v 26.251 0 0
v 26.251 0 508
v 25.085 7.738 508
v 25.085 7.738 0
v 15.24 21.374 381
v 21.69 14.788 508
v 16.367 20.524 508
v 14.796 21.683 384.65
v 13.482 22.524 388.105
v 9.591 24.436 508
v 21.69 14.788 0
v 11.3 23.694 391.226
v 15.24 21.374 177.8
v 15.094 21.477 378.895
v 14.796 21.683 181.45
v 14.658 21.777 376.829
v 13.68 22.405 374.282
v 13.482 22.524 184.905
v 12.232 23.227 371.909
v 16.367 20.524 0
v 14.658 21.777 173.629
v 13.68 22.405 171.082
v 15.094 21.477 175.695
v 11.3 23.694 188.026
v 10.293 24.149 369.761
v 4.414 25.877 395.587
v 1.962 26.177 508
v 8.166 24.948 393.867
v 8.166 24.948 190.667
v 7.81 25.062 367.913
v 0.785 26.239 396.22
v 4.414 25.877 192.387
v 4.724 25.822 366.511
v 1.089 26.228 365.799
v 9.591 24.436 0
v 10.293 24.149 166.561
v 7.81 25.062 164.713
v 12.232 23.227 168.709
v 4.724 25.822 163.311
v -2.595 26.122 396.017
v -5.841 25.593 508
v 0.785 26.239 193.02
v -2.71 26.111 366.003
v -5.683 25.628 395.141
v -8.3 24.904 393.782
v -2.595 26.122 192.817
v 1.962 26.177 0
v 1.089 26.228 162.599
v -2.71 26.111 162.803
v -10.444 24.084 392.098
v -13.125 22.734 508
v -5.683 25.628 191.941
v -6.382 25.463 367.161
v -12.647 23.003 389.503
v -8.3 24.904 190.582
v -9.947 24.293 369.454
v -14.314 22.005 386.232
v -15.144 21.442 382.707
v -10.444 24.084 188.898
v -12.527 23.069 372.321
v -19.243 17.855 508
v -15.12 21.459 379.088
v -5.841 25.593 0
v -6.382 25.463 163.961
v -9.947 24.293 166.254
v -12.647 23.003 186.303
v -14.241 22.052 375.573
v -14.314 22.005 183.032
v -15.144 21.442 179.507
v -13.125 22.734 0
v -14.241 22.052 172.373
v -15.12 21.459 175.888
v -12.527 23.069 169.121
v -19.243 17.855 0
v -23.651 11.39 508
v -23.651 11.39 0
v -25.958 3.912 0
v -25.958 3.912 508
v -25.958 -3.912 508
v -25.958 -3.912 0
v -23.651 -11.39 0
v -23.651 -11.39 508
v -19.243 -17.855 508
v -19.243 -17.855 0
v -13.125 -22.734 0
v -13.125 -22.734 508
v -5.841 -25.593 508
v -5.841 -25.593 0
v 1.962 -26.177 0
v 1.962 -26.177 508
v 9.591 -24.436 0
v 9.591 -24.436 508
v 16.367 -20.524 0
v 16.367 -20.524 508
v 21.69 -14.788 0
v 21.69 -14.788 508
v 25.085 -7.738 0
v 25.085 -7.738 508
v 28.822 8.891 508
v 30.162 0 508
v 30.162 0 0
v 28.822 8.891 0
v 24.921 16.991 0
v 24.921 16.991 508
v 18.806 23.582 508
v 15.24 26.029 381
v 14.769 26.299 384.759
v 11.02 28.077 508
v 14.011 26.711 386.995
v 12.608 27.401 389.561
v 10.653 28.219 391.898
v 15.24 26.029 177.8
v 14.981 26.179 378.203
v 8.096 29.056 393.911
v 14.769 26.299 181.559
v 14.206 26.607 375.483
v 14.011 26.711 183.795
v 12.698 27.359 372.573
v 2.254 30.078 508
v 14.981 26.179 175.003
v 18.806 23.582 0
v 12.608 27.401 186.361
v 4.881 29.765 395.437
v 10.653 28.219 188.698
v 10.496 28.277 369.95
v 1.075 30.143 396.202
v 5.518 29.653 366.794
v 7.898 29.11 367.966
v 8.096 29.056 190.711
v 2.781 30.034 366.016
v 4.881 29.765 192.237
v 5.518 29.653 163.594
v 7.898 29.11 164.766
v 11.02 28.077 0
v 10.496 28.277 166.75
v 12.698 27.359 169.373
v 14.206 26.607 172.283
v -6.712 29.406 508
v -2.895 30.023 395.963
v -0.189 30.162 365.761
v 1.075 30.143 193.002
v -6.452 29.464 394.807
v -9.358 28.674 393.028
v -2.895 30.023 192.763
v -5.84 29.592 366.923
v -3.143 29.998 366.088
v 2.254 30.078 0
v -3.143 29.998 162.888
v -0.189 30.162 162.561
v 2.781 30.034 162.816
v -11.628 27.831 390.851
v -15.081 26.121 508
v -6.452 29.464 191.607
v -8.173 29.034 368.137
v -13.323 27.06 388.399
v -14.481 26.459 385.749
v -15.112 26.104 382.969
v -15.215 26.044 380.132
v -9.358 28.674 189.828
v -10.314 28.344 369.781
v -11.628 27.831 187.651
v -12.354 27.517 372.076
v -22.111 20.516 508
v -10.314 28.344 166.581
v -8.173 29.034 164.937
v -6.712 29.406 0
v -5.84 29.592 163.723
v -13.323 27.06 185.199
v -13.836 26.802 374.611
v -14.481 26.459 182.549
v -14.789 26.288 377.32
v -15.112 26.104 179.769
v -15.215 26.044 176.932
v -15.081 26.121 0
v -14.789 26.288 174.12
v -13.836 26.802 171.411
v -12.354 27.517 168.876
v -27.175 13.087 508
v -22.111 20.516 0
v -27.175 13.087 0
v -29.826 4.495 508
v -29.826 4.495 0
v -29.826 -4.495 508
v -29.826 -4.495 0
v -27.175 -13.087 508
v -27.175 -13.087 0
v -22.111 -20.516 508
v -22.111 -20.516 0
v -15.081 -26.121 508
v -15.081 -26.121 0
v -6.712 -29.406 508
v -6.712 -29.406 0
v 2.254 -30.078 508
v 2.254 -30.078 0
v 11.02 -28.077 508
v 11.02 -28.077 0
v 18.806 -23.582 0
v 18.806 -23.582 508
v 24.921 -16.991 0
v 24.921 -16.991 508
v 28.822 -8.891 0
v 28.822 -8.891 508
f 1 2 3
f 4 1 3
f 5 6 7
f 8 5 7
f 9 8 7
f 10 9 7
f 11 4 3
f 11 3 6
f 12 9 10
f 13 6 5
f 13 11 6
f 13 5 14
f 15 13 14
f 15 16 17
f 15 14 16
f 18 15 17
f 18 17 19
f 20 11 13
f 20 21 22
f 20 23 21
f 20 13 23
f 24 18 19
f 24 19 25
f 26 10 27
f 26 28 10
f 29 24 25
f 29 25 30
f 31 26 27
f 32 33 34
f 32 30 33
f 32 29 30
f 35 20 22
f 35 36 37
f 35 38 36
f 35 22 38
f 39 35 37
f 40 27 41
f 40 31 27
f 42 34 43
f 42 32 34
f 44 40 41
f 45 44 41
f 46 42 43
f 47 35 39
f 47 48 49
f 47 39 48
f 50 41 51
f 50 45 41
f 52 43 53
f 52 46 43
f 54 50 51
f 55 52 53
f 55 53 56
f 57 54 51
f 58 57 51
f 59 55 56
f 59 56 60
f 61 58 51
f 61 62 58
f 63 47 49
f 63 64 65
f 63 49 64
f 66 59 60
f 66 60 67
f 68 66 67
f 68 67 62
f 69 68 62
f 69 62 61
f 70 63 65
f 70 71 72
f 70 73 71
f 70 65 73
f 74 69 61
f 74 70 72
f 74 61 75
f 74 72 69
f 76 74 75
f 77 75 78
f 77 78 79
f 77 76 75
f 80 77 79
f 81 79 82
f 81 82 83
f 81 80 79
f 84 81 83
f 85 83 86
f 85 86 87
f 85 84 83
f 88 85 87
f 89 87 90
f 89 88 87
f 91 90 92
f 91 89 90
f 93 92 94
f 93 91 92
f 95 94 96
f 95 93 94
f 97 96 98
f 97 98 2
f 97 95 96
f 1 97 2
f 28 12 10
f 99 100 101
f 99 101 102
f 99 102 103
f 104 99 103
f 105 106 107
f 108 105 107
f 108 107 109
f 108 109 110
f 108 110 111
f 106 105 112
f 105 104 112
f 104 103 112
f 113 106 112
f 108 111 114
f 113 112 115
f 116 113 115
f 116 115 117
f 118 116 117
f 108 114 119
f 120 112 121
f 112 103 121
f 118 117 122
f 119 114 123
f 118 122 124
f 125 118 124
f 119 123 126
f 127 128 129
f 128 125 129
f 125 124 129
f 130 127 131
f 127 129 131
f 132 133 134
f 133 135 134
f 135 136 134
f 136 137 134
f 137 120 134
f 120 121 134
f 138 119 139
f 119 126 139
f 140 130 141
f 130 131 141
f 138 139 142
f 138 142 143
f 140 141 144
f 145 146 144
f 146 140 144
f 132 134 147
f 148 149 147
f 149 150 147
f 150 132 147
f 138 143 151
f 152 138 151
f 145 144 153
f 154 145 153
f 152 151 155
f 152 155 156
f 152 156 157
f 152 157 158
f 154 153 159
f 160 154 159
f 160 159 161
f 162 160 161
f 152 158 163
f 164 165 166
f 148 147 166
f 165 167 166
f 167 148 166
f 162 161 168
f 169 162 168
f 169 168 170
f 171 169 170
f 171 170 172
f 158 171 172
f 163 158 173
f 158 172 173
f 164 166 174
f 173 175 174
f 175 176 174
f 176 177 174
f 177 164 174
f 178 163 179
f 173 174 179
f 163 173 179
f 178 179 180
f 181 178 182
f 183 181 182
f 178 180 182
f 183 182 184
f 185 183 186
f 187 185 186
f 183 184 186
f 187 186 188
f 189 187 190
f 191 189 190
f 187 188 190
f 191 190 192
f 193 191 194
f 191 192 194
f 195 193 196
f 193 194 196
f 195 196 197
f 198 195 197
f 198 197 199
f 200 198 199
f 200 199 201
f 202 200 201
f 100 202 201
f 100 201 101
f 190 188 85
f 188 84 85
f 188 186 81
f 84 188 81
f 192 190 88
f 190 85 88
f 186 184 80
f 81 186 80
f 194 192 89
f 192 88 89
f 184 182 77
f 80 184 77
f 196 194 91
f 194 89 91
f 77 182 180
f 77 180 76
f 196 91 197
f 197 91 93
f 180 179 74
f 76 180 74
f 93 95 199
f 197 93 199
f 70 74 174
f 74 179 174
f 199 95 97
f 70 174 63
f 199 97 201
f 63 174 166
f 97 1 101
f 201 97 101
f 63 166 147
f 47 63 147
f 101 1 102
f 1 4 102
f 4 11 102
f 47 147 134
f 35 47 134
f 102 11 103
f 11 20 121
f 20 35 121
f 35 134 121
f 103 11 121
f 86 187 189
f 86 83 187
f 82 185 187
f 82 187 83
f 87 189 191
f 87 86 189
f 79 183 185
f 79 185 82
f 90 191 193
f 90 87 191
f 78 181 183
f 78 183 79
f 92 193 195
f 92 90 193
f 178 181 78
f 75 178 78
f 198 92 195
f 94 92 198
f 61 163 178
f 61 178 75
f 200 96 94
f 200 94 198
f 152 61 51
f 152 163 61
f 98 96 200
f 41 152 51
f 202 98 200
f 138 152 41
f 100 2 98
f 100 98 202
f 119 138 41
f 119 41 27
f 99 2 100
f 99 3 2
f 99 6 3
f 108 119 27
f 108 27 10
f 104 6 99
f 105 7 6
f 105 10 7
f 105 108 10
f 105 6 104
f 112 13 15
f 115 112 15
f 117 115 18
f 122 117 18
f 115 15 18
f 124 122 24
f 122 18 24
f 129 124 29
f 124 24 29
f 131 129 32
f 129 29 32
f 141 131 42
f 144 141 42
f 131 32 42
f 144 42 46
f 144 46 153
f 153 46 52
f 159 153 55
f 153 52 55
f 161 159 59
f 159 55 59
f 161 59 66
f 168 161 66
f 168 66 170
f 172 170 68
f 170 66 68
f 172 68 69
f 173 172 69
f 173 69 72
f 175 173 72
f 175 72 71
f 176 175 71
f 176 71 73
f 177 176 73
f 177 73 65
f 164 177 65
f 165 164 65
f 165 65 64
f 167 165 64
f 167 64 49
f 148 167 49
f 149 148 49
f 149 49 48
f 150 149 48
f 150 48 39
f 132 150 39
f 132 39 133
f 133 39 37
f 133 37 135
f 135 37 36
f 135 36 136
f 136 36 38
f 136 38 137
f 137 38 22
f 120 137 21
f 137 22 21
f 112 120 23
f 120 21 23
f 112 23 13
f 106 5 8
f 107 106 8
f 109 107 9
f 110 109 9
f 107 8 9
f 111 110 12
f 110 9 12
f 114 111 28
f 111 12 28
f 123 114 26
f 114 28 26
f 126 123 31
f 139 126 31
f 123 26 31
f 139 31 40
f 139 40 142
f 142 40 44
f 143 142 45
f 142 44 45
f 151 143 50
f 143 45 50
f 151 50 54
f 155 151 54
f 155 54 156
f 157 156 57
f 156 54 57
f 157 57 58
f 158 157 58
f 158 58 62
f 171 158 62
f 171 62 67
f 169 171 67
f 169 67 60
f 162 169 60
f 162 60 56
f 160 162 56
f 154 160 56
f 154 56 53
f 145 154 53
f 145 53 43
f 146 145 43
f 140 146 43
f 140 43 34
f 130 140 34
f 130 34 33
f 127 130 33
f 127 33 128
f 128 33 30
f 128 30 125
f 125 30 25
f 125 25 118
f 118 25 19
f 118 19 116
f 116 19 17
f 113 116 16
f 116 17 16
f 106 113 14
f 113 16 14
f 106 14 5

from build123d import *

# Parameters (mm, degrees)
F0_R     = 30.1625
F0_R_2   = 26.2509
F1_DEPTH = 508
F2_R     = 15.24
F4_DEPTH = 106.83089
F3_R     = 15.24
F5_DEPTH = 102.80304


with BuildPart() as f1:
    # F0 (on Top) → F1 (new body)
    with BuildSketch(Plane.XY):
        Circle(F0_R)
        Circle(F0_R_2, mode=Mode.SUBTRACT)
    extrude(amount=F1_DEPTH)

    # F2 (on Front) → F4 (cut)
    with BuildSketch(Plane.XZ):
        with Locations((0, 381)):
            Circle(F2_R)
    extrude(amount=-F4_DEPTH, mode=Mode.SUBTRACT)

    # F3 (on Front) → F5 (cut)
    with BuildSketch(Plane.XZ):
        with Locations((0, 177.8)):
            Circle(F3_R)
    extrude(amount=-F5_DEPTH, mode=Mode.SUBTRACT)


solid = f1.part
